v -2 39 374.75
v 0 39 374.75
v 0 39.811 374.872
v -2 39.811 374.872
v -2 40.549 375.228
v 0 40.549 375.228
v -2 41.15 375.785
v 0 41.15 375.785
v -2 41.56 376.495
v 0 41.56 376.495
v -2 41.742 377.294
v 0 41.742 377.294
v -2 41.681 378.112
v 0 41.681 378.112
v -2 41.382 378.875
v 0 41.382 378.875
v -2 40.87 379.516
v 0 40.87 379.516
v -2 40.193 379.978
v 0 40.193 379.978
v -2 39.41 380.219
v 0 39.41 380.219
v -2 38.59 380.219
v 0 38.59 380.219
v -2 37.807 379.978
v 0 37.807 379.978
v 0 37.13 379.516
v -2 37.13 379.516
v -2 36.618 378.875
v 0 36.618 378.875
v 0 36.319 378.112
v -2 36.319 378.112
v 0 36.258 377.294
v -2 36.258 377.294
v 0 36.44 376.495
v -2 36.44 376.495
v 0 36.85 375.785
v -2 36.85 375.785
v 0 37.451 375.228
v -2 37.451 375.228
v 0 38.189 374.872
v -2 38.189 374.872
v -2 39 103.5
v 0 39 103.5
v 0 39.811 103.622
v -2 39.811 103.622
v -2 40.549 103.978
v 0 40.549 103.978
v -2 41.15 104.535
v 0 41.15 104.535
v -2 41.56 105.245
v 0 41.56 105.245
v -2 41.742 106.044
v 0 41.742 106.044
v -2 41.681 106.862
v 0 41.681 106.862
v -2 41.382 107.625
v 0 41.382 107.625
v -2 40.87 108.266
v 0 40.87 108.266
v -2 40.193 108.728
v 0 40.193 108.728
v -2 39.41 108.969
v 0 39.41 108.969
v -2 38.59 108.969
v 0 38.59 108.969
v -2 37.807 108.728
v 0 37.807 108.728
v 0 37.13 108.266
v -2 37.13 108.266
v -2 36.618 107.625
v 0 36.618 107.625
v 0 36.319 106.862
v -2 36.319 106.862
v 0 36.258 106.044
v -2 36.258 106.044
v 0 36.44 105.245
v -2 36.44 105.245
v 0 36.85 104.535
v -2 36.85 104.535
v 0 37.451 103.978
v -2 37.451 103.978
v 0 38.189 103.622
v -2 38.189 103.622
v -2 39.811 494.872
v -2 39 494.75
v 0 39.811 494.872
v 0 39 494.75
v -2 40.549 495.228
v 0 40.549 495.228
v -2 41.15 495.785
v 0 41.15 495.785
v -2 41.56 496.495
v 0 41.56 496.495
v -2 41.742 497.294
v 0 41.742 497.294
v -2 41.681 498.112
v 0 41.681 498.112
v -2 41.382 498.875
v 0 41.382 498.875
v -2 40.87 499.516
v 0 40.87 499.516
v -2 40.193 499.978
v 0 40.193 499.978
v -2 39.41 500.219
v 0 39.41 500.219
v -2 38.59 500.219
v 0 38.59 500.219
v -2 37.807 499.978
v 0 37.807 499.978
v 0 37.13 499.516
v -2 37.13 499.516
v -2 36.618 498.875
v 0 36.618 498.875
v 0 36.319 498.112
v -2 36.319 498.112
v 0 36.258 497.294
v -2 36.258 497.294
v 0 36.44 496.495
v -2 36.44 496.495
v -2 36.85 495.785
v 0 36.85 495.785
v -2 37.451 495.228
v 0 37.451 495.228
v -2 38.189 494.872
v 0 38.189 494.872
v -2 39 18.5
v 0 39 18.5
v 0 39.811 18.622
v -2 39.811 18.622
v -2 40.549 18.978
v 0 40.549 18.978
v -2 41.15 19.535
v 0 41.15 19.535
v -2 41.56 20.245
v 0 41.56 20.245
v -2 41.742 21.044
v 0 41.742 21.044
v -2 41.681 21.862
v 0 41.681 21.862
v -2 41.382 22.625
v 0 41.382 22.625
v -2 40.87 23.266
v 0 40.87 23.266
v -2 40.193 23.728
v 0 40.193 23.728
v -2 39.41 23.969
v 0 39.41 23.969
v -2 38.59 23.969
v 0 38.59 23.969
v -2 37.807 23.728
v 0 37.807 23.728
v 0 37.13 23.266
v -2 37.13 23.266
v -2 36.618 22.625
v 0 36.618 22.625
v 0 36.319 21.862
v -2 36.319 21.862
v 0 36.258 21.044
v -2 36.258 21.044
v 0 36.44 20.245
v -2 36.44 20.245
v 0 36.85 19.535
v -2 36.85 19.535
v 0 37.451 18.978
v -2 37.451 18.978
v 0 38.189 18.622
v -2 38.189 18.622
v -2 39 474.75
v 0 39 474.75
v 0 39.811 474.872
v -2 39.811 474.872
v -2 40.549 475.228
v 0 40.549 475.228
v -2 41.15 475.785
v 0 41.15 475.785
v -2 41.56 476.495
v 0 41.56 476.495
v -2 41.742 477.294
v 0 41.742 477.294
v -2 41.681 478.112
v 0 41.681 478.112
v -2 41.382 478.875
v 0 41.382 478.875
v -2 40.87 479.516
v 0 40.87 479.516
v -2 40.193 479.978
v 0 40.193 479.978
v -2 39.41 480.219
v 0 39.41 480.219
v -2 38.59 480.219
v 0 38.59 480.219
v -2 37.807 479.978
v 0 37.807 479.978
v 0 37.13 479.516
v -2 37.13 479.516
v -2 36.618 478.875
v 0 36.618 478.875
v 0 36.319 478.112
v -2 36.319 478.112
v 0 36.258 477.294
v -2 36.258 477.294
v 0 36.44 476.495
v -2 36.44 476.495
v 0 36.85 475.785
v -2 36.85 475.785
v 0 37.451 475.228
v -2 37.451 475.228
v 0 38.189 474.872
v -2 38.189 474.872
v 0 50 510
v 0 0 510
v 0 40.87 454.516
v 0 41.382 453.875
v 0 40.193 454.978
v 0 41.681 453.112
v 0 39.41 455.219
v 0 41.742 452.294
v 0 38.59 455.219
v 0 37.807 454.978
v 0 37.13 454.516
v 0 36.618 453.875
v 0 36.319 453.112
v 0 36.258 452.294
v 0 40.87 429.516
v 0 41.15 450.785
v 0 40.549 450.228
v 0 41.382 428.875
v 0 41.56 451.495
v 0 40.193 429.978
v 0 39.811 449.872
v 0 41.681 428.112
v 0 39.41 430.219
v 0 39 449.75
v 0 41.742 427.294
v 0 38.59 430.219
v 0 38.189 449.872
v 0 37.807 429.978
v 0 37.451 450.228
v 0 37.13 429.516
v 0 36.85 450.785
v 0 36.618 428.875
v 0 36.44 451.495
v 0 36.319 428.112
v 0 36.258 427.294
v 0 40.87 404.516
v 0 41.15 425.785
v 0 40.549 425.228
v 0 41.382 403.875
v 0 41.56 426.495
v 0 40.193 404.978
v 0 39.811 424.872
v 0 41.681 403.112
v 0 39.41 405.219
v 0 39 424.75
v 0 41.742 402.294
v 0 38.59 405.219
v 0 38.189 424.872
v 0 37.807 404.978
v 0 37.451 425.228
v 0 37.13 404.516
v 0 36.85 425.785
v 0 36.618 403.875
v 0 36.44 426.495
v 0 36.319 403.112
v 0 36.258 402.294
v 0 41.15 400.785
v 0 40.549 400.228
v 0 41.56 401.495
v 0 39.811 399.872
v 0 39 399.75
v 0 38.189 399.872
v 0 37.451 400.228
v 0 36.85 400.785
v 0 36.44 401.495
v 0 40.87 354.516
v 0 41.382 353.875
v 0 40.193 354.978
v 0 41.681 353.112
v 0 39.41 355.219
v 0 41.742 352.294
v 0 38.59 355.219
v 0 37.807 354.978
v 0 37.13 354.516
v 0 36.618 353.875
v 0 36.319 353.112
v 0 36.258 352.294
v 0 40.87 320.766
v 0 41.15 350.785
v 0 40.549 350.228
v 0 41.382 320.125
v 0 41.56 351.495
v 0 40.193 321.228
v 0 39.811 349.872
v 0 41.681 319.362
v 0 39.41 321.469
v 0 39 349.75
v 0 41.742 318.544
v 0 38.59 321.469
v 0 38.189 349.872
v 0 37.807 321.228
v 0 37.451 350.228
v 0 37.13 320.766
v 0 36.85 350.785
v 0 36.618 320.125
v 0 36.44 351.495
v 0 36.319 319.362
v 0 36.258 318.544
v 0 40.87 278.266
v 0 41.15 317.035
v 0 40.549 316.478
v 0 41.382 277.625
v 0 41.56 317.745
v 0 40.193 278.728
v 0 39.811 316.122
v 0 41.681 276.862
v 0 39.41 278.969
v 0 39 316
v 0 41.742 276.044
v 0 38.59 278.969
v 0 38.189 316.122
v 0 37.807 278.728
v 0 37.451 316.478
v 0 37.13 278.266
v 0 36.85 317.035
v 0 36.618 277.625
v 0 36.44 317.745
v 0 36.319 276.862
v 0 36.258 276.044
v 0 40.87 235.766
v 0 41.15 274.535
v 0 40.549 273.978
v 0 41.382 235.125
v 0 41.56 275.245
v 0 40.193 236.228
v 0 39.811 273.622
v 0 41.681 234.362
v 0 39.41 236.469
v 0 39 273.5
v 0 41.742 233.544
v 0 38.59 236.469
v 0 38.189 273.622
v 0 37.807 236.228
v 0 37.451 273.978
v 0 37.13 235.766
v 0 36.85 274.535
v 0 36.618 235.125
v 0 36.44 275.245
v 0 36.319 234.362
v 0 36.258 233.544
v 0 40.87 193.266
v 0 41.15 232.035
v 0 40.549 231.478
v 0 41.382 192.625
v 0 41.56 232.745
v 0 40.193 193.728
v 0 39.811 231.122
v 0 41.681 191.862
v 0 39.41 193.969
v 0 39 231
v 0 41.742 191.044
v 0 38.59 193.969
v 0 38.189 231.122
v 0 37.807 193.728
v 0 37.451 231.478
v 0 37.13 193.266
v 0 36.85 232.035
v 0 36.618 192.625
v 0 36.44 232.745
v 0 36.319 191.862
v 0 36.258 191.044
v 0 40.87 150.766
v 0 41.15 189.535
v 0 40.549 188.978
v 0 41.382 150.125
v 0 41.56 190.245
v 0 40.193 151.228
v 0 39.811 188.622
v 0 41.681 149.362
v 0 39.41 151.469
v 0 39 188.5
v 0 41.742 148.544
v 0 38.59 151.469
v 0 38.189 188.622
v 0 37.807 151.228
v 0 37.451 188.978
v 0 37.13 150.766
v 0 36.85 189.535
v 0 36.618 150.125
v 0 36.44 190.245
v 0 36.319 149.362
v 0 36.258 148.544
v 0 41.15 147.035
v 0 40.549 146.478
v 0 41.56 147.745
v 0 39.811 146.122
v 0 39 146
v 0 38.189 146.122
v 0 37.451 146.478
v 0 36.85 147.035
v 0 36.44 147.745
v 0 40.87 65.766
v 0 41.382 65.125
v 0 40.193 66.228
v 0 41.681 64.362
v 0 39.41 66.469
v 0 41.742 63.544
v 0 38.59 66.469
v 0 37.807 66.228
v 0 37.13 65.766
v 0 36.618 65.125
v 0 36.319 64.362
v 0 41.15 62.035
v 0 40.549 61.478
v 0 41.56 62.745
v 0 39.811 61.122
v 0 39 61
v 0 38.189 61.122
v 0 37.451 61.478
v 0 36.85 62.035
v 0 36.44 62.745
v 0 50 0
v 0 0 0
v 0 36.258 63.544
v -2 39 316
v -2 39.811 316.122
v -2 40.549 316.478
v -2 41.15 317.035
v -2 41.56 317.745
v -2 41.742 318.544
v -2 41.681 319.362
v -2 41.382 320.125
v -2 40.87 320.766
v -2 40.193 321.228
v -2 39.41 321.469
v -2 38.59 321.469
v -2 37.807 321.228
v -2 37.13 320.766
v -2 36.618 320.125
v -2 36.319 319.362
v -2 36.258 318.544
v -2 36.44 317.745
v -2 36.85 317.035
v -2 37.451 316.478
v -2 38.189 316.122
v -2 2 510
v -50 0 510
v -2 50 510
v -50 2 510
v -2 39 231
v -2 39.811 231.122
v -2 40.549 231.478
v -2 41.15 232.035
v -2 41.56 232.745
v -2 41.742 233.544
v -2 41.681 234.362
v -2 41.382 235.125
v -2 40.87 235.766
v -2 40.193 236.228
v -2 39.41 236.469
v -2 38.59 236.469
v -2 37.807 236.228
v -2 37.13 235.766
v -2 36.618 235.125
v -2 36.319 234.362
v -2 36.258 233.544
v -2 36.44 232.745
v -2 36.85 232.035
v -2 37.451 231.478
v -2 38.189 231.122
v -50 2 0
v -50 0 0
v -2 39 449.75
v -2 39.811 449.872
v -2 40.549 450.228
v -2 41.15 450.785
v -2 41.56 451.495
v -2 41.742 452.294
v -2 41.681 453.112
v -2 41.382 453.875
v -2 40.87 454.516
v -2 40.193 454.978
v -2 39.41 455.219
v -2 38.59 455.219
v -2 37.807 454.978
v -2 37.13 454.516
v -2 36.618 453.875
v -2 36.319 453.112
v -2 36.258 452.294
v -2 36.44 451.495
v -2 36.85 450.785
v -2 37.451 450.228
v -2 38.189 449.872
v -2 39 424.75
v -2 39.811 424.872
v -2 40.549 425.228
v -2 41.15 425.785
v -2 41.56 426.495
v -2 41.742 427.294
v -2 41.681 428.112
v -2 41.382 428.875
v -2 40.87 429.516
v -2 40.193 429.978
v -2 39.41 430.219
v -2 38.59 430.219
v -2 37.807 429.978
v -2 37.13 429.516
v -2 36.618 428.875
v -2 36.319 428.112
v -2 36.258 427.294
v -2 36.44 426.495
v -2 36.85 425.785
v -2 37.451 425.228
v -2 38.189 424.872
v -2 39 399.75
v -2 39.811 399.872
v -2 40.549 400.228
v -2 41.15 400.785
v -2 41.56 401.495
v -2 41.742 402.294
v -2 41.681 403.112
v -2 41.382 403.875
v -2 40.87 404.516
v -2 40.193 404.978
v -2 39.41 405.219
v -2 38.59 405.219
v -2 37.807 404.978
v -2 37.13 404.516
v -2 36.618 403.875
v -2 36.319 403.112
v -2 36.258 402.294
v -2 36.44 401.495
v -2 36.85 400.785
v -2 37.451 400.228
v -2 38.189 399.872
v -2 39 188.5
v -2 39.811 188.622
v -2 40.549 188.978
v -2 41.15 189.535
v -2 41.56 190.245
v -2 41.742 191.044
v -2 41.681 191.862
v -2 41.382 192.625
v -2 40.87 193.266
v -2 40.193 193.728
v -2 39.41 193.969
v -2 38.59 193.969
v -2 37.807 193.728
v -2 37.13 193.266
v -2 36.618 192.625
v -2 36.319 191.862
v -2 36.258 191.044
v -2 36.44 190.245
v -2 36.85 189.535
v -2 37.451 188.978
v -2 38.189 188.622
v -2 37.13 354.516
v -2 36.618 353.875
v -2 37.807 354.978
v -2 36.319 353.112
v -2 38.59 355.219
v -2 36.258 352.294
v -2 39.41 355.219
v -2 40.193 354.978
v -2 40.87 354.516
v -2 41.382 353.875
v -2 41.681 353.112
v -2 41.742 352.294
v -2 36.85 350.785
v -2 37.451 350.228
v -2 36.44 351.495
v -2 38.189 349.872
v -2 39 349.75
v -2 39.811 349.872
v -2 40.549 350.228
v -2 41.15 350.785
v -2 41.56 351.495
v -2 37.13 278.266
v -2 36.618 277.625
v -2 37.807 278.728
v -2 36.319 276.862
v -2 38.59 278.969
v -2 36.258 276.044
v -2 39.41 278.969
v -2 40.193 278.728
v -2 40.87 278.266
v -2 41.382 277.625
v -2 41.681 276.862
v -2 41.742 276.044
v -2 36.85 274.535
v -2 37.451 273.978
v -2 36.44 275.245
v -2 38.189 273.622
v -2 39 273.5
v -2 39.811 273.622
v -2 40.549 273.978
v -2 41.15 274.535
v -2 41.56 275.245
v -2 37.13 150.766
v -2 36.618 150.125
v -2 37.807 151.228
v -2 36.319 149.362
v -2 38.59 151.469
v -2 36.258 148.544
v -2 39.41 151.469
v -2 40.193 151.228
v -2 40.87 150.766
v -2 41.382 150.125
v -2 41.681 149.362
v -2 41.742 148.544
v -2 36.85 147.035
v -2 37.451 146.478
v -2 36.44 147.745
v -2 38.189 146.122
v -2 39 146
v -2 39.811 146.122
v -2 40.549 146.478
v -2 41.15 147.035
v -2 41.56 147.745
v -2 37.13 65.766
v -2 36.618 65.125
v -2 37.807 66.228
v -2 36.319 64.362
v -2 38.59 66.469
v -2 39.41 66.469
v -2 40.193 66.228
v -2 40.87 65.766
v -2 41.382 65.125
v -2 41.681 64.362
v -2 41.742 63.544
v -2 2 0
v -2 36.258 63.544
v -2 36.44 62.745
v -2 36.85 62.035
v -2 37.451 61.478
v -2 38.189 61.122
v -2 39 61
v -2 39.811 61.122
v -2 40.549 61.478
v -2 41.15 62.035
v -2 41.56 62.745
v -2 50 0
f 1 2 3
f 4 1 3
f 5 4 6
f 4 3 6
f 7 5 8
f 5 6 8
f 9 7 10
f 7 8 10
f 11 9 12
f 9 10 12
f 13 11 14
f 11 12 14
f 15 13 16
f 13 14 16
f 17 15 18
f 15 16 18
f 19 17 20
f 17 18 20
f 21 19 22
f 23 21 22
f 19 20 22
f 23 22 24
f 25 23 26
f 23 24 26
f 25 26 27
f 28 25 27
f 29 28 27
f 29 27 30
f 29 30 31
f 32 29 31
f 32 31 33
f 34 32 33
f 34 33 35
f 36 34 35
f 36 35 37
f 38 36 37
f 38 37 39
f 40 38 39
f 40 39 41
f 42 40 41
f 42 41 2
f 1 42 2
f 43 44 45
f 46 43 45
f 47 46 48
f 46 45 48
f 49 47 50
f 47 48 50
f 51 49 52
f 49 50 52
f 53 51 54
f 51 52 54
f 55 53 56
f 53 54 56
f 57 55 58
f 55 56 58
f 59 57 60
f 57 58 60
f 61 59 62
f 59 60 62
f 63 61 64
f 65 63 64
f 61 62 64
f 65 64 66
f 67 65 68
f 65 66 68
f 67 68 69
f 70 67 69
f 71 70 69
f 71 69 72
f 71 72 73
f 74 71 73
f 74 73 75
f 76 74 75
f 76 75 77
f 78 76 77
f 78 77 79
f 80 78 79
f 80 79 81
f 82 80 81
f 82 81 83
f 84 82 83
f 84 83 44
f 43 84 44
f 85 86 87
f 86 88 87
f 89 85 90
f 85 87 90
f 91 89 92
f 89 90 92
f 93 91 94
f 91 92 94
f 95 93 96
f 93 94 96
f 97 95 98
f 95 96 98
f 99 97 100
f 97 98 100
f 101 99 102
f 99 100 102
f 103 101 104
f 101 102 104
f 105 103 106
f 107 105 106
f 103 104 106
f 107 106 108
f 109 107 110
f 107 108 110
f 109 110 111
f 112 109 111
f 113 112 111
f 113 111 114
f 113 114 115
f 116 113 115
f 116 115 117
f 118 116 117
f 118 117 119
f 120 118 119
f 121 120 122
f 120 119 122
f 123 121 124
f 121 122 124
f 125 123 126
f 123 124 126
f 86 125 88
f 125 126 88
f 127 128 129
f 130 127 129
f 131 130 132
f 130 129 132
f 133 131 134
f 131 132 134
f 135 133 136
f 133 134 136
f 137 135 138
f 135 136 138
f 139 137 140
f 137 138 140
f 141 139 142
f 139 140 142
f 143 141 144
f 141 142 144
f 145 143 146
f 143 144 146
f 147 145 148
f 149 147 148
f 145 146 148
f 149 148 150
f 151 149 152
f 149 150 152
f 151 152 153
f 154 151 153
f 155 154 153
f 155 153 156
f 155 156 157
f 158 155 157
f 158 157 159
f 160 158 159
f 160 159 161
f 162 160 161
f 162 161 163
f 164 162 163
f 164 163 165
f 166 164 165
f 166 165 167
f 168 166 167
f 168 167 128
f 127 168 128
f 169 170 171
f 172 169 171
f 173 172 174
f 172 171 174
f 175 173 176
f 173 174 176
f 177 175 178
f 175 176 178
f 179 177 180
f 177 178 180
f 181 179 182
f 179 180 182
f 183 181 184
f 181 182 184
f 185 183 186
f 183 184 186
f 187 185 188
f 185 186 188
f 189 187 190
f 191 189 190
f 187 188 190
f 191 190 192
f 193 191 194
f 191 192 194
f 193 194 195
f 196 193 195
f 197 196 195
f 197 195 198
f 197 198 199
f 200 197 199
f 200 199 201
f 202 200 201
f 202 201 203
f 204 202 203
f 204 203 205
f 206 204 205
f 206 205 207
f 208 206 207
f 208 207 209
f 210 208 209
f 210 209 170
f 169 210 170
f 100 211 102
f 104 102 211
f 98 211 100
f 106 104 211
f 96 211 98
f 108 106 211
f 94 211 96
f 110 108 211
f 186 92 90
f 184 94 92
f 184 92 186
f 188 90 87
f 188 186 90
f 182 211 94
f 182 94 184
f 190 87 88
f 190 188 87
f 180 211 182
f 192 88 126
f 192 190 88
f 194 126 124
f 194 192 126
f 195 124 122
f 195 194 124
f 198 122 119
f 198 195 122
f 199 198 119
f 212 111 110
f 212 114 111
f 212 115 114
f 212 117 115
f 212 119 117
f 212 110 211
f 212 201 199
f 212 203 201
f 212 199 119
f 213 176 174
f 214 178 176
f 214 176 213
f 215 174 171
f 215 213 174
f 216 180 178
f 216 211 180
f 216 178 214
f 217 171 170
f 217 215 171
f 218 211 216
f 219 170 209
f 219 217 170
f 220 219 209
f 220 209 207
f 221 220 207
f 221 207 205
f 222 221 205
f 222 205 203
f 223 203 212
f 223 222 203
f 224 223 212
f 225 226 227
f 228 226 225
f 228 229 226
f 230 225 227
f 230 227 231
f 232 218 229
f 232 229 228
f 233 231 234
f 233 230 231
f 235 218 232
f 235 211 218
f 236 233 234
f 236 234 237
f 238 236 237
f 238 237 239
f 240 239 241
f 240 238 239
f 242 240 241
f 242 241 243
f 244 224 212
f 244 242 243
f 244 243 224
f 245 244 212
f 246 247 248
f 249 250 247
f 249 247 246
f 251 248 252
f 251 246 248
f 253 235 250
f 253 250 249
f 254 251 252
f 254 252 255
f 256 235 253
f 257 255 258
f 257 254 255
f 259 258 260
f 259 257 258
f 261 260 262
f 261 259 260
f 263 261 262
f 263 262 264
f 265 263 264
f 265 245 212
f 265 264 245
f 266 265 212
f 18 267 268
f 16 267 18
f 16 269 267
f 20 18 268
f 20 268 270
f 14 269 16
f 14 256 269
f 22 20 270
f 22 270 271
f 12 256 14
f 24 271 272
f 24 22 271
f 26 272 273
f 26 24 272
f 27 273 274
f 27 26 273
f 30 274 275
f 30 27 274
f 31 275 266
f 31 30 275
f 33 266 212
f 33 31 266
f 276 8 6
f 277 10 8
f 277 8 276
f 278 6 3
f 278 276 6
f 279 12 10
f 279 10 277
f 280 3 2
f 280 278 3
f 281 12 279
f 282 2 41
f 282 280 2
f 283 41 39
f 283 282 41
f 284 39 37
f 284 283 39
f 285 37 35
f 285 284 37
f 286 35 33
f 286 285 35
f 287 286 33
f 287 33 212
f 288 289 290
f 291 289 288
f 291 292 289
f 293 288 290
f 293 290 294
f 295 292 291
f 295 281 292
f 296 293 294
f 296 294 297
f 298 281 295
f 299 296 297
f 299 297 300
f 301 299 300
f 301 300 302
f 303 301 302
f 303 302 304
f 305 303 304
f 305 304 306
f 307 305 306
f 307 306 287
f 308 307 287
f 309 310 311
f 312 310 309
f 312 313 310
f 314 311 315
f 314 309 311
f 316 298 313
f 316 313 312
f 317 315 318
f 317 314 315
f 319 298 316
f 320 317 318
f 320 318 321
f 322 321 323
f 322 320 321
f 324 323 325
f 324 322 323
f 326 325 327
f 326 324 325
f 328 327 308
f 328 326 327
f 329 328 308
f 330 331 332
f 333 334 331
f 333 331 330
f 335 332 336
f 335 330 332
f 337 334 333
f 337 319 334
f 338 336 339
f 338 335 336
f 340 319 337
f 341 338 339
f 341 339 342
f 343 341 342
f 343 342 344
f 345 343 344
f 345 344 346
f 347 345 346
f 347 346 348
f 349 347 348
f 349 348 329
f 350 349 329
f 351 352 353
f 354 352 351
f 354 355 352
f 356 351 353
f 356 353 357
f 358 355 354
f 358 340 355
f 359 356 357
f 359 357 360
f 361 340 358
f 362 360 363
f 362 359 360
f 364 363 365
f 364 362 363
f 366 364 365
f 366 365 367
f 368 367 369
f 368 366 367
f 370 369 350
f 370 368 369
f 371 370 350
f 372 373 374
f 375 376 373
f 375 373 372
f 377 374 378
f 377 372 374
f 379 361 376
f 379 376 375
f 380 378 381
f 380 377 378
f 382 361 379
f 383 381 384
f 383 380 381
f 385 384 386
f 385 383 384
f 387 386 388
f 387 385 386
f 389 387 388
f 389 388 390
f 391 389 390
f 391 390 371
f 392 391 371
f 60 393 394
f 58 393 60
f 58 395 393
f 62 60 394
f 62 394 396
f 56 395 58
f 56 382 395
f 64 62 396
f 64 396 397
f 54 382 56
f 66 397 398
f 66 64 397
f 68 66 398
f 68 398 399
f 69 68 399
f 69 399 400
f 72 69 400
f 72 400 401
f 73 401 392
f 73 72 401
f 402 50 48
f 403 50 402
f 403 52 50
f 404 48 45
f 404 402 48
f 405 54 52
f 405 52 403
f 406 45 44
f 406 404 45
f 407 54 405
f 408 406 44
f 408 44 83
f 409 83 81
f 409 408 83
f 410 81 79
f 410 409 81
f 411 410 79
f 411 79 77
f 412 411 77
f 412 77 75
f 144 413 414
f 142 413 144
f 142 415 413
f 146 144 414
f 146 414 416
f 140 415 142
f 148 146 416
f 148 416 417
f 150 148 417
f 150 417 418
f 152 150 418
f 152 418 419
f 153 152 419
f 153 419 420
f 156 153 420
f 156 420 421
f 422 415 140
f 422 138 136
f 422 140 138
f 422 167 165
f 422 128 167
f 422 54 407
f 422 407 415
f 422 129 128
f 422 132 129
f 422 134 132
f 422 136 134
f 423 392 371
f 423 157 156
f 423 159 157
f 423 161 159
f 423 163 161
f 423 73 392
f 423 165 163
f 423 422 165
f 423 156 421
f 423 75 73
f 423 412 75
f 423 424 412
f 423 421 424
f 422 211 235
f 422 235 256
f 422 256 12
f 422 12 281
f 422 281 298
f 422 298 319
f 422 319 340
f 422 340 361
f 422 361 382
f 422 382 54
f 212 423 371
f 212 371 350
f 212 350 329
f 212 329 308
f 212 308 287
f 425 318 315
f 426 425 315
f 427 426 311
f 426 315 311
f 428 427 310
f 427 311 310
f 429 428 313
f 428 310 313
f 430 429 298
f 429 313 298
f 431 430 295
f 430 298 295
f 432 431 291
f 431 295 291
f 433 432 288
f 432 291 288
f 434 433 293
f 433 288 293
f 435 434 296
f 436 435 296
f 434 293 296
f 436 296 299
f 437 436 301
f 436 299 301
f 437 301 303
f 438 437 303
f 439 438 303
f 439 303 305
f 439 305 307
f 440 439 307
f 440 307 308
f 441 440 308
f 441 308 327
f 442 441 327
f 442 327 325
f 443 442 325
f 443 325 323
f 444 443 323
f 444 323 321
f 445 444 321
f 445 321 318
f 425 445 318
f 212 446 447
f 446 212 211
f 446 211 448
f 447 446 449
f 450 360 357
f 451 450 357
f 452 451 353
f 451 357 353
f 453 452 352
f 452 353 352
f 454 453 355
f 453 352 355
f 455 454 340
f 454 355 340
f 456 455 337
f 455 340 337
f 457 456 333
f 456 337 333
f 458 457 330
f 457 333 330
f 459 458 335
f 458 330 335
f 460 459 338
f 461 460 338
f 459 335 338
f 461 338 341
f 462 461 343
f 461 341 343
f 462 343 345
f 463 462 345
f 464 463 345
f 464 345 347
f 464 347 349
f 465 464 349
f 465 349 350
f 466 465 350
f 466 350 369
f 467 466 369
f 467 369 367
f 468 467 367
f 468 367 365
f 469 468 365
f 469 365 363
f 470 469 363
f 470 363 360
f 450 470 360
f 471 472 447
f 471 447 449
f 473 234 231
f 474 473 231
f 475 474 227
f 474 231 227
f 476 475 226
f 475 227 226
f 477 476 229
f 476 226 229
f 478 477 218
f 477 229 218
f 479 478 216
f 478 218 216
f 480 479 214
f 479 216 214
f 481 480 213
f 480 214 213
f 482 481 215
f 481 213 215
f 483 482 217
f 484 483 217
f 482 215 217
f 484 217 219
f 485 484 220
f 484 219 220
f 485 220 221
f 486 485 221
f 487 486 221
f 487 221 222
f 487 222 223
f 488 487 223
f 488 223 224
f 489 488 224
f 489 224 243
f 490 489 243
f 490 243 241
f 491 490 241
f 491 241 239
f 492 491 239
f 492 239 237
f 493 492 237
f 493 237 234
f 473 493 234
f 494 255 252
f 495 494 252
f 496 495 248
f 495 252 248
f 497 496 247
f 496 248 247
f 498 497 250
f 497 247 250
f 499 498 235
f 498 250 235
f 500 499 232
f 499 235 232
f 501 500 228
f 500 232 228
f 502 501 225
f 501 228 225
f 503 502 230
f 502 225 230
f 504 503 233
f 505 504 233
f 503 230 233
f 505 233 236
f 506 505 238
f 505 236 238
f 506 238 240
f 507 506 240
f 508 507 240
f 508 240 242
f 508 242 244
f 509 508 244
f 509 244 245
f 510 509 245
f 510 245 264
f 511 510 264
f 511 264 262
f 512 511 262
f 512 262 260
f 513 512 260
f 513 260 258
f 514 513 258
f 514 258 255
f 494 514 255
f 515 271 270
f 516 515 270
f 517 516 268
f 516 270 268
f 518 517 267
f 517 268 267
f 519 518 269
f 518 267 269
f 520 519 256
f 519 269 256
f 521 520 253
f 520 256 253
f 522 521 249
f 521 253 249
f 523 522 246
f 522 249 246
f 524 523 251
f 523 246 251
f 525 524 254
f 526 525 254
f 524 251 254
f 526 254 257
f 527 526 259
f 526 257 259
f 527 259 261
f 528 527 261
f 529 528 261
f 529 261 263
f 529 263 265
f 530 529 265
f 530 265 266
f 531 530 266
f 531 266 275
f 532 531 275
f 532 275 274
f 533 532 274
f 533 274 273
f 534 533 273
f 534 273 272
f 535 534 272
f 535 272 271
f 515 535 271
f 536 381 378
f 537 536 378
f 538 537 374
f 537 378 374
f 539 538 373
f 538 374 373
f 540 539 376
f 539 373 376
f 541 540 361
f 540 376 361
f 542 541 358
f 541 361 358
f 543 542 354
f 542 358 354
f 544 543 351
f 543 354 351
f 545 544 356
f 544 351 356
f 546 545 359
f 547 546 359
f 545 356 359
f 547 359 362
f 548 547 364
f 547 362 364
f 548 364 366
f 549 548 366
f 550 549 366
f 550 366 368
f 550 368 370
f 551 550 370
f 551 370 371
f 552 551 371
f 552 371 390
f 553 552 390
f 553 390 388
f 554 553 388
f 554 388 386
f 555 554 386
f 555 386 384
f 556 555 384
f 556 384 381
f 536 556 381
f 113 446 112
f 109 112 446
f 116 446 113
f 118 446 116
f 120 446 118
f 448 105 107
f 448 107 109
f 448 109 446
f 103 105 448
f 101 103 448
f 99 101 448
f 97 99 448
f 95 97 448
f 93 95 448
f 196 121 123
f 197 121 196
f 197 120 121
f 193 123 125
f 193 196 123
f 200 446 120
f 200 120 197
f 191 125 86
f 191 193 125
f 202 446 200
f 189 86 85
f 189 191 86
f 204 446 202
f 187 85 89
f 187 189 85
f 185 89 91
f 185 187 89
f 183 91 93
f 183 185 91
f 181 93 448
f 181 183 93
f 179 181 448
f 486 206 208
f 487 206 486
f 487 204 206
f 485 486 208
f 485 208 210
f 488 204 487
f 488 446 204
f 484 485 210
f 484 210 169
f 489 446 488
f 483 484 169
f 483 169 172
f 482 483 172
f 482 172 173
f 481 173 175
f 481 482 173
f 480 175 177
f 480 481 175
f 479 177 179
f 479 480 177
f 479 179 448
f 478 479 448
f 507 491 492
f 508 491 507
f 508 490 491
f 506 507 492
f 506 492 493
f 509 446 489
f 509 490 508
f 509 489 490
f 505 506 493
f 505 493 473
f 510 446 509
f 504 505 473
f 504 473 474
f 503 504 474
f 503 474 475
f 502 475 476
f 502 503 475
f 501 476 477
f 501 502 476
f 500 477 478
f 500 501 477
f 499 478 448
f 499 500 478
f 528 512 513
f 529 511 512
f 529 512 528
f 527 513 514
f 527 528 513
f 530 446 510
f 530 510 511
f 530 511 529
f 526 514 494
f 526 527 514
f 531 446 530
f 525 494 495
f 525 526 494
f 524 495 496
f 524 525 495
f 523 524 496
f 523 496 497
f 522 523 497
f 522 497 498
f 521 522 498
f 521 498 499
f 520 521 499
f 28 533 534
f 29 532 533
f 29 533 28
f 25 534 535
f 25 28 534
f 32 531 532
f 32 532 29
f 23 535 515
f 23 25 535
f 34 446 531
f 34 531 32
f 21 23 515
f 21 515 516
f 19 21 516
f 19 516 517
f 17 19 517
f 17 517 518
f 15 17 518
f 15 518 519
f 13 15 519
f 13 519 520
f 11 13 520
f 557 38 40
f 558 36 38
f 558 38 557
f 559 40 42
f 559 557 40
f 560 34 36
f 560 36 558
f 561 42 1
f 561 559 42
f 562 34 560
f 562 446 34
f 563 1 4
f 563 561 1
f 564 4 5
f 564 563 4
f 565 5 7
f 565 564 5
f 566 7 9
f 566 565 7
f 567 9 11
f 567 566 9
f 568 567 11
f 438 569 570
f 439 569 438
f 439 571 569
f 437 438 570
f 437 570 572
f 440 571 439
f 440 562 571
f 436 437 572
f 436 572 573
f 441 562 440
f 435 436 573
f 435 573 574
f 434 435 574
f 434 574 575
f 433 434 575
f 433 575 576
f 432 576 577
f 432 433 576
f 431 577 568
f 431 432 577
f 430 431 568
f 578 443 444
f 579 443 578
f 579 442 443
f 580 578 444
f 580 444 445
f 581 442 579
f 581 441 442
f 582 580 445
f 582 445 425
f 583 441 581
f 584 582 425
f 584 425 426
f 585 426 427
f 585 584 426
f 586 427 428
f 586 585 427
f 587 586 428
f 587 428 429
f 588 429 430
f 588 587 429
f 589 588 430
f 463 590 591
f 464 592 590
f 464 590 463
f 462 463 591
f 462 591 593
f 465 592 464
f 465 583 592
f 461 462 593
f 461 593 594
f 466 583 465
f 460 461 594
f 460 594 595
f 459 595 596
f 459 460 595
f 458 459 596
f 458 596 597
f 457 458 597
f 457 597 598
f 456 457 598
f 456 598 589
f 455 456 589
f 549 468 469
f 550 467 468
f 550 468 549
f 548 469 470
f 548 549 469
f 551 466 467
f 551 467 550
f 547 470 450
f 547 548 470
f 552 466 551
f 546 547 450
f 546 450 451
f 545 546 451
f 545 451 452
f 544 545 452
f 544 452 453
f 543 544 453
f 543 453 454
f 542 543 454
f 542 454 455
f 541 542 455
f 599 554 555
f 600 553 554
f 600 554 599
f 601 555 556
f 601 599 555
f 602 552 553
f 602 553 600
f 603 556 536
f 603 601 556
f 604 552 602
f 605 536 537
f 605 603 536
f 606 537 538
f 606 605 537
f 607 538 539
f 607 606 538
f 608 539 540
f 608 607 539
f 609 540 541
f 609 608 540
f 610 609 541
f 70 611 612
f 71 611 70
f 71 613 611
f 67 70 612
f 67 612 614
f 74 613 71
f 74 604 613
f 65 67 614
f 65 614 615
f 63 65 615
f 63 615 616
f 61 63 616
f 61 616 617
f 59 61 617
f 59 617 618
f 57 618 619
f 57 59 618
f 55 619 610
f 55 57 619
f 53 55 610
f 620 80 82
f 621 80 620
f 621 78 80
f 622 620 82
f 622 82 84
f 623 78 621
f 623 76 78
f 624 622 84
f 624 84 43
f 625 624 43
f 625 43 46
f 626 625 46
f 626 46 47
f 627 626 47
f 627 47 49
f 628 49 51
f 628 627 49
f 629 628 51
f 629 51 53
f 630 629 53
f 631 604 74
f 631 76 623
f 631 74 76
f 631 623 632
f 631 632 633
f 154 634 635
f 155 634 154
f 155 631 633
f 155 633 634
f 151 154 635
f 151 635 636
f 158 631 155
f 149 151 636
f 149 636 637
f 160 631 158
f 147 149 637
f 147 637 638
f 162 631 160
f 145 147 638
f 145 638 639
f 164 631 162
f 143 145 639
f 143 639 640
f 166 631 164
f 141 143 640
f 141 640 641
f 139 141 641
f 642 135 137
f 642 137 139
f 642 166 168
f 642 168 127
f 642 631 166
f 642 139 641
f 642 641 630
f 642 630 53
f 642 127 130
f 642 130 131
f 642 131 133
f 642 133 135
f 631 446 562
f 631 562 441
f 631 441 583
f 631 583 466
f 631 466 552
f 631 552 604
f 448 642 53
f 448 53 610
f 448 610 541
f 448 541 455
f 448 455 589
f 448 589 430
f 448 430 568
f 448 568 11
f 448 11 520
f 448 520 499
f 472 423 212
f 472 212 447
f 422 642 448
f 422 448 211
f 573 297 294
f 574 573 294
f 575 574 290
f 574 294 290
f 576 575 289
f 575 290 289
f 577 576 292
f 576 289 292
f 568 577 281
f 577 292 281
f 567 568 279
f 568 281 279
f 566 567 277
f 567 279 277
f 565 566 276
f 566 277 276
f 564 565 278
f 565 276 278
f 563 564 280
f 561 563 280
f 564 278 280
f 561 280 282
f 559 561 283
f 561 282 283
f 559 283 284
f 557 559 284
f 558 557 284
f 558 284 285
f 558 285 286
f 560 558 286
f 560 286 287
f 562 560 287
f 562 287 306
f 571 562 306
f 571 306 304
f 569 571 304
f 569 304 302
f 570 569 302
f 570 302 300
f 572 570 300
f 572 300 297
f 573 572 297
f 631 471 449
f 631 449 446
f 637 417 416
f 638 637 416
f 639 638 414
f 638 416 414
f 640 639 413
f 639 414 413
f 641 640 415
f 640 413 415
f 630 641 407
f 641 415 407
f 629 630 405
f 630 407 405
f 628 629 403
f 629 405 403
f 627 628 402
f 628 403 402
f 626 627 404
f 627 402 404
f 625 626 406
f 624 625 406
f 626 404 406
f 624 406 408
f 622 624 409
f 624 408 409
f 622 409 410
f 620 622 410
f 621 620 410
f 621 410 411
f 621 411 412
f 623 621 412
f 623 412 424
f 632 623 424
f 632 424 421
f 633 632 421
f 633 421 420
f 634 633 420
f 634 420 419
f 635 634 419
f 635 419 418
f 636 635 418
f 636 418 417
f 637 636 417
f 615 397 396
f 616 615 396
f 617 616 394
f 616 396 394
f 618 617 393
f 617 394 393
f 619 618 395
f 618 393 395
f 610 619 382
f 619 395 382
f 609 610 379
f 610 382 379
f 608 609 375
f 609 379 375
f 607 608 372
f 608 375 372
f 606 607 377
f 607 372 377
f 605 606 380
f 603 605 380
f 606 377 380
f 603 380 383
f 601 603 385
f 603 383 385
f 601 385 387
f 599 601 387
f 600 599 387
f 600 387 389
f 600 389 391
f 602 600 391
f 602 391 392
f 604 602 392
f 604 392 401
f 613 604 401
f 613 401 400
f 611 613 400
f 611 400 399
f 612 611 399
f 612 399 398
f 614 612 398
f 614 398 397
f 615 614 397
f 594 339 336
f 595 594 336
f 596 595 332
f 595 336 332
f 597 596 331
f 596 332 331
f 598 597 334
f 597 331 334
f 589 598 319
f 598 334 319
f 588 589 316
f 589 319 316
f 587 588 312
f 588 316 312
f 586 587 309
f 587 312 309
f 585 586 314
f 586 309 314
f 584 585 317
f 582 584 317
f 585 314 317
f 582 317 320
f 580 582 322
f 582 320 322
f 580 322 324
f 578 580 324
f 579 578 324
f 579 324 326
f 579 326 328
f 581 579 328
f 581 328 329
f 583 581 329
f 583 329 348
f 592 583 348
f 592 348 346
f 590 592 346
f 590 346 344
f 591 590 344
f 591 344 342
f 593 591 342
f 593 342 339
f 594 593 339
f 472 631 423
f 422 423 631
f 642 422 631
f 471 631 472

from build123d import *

# Parameters (mm, degrees)
BOSS_EXTRUDE1_DEPTH = 510
SKETCH2_R           = 2.75
CUT_EXTRUDE1_DEPTH  = 5


with BuildPart() as part:
    # Sketch1 → Boss-Extrude1 (new body)
    with BuildSketch(Plane.XY):
        Polygon((0, 0), (-50, 0), (-50, 2), (-2, 2), (-2, 50), (0, 50), align=None)
    extrude(amount=BOSS_EXTRUDE1_DEPTH)

    # Sketch2 → Cut-Extrude1 (cut, symmetric)
    with BuildSketch(Plane(origin=(0, 0, 0), x_dir=(0, 0, -1), z_dir=(1, 0, 0))):
        with Locations((-21.25, 39)):
            Circle(SKETCH2_R)
        with Locations((-63.75, 39)):
            Circle(SKETCH2_R)
        with Locations((-106.25, 39)):
            Circle(SKETCH2_R)
        with Locations((-148.75, 39)):
            Circle(SKETCH2_R)
        with Locations((-191.25, 39)):
            Circle(SKETCH2_R)
        with Locations((-233.75, 39)):
            Circle(SKETCH2_R)
        with Locations((-276.25, 39)):
            Circle(SKETCH2_R)
        with Locations((-318.75, 39)):
            Circle(SKETCH2_R)
        with Locations((-352.5, 39)):
            Circle(SKETCH2_R)
        with Locations((-377.5, 39)):
            Circle(SKETCH2_R)
        with Locations((-402.5, 39)):
            Circle(SKETCH2_R)
        with Locations((-427.5, 39)):
            Circle(SKETCH2_R)
        with Locations((-452.5, 39)):
            Circle(SKETCH2_R)
        with Locations((-477.5, 39)):
            Circle(SKETCH2_R)
        with Locations((-497.5, 39)):
            Circle(SKETCH2_R)
    extrude(amount=CUT_EXTRUDE1_DEPTH, both=True, mode=Mode.SUBTRACT)


solid = part.part
